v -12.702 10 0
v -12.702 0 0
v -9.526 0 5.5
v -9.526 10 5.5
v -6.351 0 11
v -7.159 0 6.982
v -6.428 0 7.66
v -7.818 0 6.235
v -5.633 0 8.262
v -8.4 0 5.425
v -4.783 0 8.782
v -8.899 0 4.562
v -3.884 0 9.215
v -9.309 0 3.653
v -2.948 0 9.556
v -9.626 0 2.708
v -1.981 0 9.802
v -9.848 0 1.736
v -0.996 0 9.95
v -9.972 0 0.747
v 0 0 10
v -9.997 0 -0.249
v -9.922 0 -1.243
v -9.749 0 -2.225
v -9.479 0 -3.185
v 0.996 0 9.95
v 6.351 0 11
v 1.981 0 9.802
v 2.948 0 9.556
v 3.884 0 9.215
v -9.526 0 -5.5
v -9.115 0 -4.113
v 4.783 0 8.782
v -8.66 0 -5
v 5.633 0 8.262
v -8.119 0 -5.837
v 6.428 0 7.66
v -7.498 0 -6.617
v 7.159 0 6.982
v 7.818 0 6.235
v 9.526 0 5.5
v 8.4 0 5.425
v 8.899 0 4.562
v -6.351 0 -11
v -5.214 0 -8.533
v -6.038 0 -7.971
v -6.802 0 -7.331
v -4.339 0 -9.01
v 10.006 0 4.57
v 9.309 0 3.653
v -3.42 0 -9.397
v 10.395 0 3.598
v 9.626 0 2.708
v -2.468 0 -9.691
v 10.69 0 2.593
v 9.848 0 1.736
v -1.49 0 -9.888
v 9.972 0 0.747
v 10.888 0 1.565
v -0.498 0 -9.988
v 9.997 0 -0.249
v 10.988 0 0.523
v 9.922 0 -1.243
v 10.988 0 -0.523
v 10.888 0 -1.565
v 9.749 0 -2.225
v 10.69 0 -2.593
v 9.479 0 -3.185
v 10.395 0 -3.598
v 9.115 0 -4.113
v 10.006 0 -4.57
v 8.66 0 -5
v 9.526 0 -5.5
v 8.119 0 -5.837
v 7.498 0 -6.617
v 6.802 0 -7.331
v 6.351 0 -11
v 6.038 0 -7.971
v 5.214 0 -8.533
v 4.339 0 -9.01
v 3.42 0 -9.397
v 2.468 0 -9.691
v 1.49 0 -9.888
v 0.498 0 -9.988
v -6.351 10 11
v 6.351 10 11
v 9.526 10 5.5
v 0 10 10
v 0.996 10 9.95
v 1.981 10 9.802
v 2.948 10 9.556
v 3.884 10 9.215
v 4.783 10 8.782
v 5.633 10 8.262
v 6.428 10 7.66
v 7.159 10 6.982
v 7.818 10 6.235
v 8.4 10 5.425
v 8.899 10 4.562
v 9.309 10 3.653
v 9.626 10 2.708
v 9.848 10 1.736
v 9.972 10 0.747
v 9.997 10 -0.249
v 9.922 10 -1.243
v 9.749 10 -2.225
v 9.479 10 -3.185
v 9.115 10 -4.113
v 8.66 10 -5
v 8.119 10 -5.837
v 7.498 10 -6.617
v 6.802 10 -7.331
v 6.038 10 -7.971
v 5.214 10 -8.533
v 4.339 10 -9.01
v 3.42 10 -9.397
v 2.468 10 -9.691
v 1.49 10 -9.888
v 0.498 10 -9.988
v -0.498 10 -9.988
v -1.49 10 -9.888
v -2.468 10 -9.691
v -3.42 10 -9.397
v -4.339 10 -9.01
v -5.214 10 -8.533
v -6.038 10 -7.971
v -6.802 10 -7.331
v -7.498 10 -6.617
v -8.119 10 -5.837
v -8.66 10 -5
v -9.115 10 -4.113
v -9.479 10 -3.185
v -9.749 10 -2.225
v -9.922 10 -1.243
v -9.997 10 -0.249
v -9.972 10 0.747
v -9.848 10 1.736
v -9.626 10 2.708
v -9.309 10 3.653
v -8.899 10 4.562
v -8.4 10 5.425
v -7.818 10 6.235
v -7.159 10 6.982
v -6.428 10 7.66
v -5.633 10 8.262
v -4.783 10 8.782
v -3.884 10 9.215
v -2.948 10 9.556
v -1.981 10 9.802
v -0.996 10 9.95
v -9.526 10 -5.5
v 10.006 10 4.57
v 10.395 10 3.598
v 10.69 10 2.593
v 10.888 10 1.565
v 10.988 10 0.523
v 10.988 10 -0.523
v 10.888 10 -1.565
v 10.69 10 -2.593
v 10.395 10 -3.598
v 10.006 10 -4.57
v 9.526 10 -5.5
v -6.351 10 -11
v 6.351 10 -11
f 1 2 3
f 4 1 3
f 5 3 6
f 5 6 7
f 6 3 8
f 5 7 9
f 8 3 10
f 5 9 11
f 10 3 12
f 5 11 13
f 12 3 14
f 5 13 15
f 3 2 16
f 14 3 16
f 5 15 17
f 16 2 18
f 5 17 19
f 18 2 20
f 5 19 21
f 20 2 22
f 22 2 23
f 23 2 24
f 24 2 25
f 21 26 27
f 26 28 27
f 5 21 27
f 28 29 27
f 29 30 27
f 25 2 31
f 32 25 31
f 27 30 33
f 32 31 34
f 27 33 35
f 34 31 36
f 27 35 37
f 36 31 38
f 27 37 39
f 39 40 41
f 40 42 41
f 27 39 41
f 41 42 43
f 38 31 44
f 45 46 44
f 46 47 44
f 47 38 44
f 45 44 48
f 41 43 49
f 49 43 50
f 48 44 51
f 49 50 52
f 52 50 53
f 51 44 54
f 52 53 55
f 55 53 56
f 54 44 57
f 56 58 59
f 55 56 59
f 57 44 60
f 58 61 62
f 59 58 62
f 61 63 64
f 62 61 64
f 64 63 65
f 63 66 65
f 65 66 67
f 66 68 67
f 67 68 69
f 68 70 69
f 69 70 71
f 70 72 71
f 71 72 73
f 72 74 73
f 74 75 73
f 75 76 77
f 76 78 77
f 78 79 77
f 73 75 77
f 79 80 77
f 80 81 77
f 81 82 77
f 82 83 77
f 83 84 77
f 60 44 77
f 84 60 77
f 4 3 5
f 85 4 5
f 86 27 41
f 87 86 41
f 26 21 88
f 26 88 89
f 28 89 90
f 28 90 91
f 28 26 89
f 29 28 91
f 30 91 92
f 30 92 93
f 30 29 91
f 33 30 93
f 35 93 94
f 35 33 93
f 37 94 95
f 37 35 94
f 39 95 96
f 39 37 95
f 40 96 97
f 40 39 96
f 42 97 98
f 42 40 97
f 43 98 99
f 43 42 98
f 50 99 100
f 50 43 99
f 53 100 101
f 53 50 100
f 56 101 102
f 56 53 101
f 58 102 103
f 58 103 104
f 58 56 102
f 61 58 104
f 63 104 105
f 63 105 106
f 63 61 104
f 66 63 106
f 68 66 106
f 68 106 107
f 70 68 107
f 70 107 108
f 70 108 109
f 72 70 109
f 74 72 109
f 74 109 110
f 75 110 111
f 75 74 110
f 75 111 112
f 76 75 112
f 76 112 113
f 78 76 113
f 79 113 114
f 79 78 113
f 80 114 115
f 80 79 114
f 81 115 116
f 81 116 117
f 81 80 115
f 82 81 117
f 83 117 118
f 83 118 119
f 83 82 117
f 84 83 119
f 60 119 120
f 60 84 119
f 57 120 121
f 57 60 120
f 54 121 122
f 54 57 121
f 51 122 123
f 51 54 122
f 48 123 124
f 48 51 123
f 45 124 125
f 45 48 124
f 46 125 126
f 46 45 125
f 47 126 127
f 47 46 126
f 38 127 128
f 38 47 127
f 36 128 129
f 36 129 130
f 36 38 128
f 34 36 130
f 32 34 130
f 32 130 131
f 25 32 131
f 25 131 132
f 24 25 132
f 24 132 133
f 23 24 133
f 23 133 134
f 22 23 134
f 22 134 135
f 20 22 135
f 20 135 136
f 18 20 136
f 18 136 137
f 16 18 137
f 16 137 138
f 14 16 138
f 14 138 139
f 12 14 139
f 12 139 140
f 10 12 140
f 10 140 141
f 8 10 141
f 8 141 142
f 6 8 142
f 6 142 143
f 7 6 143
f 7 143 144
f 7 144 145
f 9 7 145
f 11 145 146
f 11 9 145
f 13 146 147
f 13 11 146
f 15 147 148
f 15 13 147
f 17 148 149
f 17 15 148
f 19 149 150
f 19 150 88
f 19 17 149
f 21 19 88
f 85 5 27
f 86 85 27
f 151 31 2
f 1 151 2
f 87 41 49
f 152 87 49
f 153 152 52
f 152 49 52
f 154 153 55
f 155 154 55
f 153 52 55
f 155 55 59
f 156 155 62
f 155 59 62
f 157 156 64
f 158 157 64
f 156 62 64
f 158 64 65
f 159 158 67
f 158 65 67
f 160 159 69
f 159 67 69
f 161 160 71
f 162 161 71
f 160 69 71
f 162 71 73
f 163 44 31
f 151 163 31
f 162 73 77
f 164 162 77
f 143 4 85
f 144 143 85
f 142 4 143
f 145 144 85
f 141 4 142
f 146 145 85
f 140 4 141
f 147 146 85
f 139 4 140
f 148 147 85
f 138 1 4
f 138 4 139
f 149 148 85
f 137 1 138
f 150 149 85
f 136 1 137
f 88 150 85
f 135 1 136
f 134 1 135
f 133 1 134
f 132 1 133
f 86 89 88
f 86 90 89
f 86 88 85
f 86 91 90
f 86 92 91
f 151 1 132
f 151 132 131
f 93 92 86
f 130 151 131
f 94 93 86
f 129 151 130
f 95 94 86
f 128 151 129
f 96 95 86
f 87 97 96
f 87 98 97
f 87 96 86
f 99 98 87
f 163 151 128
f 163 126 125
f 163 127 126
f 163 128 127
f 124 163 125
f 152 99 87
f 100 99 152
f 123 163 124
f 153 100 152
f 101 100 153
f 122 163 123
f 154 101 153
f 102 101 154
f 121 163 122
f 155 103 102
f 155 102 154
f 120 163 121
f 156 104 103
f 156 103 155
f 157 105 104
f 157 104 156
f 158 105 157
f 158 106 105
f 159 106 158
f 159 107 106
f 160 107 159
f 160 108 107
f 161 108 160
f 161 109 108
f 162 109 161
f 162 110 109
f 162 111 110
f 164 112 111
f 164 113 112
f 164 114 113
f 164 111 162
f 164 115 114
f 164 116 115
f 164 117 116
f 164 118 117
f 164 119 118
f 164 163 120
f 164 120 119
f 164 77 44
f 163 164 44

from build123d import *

# Parameters (mm, degrees)
SKETCH1_R           = 11
SKETCH1_R_2         = 10
BOSS_EXTRUDE3_DEPTH = 10


with BuildPart() as part:
    # Sketch1 → Boss-Extrude3 (new body)
    # profile 1 of 6: a face of its own
    with BuildSketch(Plane(origin=(0, 0, 0), x_dir=(1, 0, 0), z_dir=(0, 1, 0))):
        Circle(SKETCH1_R)
        with Locations(Location((0, 0, 0), (0, 0, 270))):
            Circle(SKETCH1_R_2, mode=Mode.SUBTRACT)
    # profile 2 of 6: a face of its own
    with BuildSketch(Plane(origin=(0, 0, 0), x_dir=(1, 0, 0), z_dir=(0, 1, 0))):
        with BuildLine():
            ThreePointArc((-9.526279142, -5.500000519), (-11, -3e-09), (-9.526279145, 5.500000513))
            Line((-9.526279145, 5.500000513), (-12.701705922, 0))
            Line((-12.701705922, 0), (-9.526279142, -5.500000519))
        make_face()
    # profile 3 of 6: a face of its own
    with BuildSketch(Plane(origin=(0, 0, 0), x_dir=(1, 0, 0), z_dir=(0, 1, 0))):
        with BuildLine():
            Line((-6.350852961, -11), (5.6e-08, -11))
            ThreePointArc((5.6e-08, -11), (-5.499999716, -9.526279605), (-9.526279142, -5.500000519))
            Line((-9.526279142, -5.500000519), (-6.350852961, -11))
        make_face()
    # profile 4 of 6: a face of its own
    with BuildSketch(Plane(origin=(0, 0, 0), x_dir=(1, 0, 0), z_dir=(0, 1, 0))):
        with BuildLine():
            Line((6.350852961, -11), (9.526279442, -5.5))
            ThreePointArc((9.526279442, -5.5), (5.500000024, -9.526279428), (5.6e-08, -11))
            Line((5.6e-08, -11), (6.350852961, -11))
        make_face()
    # profile 5 of 6: a face of its own
    with BuildSketch(Plane(origin=(0, 0, 0), x_dir=(1, 0, 0), z_dir=(0, 1, 0))):
        with BuildLine():
            ThreePointArc((0, 11), (5.5, 9.526279442), (9.526279442, 5.5))
            Line((9.526279442, 5.5), (6.350852961, 11))
            Line((6.350852961, 11), (0, 11))
        make_face()
    # profile 6 of 6: a face of its own
    with BuildSketch(Plane(origin=(0, 0, 0), x_dir=(1, 0, 0), z_dir=(0, 1, 0))):
        with BuildLine():
            ThreePointArc((-9.526279145, 5.500000513), (-5.499999743, 9.52627959), (0, 11))
            Line((0, 11), (-6.350852961, 11))
            Line((-6.350852961, 11), (-9.526279145, 5.500000513))
        make_face()
    extrude(amount=BOSS_EXTRUDE3_DEPTH)


solid = part.part
